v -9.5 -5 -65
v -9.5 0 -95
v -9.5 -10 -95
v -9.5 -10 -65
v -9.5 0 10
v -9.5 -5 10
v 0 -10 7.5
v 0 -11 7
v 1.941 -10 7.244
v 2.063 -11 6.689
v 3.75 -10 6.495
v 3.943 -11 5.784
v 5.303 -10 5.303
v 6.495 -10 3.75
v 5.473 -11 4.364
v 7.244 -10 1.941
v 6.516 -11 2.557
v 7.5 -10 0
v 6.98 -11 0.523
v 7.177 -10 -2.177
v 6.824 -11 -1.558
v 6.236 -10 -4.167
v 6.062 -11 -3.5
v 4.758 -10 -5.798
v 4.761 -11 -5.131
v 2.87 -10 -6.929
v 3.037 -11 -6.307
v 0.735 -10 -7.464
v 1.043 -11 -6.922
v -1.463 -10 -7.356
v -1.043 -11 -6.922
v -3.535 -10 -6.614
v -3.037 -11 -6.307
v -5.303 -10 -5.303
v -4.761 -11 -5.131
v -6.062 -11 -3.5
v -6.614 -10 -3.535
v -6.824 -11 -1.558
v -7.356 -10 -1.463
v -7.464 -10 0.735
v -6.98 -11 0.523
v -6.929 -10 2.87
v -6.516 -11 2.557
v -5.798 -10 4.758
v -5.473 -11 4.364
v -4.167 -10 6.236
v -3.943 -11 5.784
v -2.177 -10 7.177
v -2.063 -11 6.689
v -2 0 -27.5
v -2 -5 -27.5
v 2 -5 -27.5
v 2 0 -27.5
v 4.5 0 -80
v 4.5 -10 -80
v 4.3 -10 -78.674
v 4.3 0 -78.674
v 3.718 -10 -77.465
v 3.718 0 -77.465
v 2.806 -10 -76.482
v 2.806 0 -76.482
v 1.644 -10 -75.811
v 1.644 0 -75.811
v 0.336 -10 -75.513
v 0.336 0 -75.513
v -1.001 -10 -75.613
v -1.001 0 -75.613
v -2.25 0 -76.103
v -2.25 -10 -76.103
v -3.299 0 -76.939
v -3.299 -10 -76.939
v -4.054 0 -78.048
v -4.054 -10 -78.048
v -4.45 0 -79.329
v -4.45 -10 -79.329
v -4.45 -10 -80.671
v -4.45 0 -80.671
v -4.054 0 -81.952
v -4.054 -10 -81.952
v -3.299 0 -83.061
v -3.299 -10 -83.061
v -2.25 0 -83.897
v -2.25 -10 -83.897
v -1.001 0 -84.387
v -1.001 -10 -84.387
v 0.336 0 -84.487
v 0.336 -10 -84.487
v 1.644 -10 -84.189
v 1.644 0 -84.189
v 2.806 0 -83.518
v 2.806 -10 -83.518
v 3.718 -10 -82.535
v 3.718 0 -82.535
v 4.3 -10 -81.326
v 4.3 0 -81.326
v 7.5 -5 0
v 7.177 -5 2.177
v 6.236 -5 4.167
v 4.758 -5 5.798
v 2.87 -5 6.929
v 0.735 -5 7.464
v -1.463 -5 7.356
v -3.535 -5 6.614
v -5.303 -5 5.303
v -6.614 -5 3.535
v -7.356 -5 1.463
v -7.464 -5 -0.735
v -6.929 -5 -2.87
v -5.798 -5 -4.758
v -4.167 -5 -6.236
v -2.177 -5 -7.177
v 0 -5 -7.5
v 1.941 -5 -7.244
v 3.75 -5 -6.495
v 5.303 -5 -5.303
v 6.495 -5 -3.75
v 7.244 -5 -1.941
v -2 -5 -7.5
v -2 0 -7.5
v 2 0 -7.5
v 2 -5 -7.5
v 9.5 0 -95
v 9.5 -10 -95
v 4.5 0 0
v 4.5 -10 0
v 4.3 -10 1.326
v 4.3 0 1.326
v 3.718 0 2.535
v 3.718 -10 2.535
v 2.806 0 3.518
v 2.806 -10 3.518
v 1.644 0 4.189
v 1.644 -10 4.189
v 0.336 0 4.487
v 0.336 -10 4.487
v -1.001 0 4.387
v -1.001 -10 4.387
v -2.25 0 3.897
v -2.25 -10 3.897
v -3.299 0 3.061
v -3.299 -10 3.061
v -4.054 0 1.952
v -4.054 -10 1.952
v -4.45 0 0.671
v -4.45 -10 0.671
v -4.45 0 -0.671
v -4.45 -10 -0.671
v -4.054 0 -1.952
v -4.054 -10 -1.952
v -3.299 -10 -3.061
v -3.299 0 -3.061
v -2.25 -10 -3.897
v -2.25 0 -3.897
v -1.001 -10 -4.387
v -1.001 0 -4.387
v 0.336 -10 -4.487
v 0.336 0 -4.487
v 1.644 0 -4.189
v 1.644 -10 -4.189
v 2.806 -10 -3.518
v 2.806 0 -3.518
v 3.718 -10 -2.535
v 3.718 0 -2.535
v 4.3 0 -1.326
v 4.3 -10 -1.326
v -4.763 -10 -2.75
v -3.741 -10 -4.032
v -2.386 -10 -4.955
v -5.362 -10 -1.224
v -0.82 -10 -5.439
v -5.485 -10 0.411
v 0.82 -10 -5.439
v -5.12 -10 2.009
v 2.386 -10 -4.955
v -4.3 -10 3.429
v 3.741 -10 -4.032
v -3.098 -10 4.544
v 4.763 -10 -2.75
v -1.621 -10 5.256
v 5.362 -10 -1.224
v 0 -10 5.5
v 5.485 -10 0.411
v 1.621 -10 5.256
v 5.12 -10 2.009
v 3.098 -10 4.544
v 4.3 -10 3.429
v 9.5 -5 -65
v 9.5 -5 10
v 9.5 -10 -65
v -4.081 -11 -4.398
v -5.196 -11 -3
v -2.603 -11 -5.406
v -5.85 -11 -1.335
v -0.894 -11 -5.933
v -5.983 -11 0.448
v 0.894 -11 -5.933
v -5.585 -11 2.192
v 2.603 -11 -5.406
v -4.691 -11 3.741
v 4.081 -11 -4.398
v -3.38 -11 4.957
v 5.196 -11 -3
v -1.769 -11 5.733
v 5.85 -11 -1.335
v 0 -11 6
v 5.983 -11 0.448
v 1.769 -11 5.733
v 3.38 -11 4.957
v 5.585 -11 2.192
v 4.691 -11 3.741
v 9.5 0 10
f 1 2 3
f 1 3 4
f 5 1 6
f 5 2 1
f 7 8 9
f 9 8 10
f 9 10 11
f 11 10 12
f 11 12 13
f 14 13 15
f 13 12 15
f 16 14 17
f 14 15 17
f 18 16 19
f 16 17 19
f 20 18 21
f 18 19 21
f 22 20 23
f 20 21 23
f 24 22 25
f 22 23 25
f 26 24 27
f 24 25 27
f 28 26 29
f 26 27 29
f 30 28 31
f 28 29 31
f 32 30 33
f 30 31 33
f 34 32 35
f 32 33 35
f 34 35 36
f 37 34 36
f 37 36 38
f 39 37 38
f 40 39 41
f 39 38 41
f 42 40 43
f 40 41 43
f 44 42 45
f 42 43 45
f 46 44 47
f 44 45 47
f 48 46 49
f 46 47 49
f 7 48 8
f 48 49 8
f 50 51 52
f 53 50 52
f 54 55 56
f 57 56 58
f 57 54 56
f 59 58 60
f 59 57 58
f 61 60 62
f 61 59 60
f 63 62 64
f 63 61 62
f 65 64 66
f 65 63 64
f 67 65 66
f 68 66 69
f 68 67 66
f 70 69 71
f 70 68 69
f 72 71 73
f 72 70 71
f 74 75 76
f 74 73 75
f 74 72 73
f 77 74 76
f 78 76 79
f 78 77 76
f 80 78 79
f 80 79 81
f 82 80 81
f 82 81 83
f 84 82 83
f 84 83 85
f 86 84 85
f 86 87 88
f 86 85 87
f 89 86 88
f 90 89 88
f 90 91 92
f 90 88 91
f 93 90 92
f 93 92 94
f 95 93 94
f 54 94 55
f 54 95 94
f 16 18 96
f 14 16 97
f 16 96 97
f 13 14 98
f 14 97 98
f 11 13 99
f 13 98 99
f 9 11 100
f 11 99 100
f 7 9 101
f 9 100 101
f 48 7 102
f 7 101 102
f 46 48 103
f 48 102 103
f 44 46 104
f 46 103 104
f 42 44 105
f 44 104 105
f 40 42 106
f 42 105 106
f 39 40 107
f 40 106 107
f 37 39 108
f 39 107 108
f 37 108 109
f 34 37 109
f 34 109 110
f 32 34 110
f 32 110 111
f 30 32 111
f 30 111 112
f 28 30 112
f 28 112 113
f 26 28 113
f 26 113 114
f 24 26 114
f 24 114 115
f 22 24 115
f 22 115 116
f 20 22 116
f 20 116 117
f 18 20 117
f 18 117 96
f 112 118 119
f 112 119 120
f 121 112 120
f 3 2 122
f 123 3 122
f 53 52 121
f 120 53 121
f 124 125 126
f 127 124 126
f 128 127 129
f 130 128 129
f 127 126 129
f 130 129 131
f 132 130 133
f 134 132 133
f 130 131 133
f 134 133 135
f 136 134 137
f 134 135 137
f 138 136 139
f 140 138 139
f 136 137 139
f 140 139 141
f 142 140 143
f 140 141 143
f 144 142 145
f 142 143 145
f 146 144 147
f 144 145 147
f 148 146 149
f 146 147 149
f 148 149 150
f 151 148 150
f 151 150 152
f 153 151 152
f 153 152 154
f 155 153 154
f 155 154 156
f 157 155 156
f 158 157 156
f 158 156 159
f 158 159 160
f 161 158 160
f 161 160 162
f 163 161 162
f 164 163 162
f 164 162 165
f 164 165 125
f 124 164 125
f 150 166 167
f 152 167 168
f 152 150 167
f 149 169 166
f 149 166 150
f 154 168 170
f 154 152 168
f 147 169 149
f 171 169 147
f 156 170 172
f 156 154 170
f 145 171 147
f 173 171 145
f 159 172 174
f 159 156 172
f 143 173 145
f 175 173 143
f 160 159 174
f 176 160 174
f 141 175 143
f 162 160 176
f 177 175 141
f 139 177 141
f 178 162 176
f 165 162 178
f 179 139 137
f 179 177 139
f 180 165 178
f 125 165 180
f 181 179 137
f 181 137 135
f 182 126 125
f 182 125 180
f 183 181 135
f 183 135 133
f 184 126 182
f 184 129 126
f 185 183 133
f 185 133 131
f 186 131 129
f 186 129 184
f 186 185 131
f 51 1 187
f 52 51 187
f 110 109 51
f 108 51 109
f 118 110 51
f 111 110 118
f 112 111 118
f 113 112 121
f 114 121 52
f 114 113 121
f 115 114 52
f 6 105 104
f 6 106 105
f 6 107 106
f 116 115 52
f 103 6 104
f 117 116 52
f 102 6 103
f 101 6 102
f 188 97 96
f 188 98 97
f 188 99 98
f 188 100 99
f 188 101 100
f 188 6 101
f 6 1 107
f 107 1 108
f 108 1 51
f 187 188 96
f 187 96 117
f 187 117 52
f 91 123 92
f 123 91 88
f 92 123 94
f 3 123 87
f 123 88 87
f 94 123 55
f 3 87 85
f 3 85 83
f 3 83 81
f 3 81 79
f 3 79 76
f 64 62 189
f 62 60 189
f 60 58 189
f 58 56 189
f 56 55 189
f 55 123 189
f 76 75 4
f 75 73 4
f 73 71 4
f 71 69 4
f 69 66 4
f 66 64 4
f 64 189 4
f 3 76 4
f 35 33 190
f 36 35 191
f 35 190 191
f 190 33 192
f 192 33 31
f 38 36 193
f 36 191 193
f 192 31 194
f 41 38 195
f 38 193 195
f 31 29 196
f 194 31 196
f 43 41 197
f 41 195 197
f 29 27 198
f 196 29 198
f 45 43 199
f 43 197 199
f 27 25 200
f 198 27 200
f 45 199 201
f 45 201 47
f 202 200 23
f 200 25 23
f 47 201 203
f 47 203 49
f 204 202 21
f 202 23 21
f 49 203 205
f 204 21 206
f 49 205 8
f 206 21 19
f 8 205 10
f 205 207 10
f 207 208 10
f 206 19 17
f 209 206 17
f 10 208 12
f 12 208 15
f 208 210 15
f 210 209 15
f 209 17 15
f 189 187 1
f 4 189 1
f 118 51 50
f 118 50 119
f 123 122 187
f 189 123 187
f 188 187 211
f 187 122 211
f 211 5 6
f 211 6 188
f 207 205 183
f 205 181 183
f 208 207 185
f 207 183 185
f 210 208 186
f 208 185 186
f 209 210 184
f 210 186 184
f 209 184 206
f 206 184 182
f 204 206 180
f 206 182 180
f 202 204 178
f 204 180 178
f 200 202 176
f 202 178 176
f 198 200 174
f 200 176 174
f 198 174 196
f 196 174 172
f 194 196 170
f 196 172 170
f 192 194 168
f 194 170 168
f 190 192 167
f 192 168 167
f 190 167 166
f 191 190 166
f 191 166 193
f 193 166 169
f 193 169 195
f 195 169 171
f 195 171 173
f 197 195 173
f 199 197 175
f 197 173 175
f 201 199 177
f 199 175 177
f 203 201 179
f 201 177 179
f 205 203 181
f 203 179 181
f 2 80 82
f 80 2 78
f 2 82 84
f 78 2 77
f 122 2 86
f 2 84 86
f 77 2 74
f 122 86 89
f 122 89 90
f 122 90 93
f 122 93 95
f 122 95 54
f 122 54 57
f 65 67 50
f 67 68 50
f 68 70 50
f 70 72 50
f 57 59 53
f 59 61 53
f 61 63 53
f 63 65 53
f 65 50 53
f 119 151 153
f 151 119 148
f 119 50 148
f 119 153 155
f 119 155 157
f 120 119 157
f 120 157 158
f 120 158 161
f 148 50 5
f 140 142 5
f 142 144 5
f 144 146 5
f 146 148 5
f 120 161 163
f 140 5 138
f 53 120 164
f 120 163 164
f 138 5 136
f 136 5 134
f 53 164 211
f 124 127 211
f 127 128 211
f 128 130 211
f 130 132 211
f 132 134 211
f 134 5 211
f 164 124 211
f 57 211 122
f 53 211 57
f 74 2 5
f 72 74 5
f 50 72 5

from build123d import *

# Parameters (mm, degrees)
F0_W      = 19
F0_H      = 105
F1_DEPTH  = 5
F2_R      = 7.5
F3_DEPTH  = 5
F6_R      = 4.5
F7_DEPTH  = 10.001
F8_W      = 19
F8_H      = 30
F9_DEPTH  = 10
F10_R     = 4.5
F11_DEPTH = 11.001
F12_W     = 4
F12_H     = 20
F13_DEPTH = 5


with BuildPart() as f1:
    # F0 (on Front) → F1 (new body)
    with BuildSketch(Plane.XZ):
        with Locations((0, -42.5)):
            Rectangle(F0_W, F0_H)
    extrude(amount=F1_DEPTH)

    # F2 (on face) → F3 (join)
    with BuildSketch(Plane.XZ.offset(5)):
        Circle(F2_R)
    extrude(amount=F3_DEPTH)

    # F4 (on Right) → F5 (revolve)
    with BuildSketch(Plane.YZ):
        Polygon((-10, 5.5), (-10, 7.5), (-11, 7), (-11, 6), align=None)
    revolve(axis=Axis((0, -10.5, 0), (0, 1, 0)))

    # F6 (on face) → F7 (cut, through all)
    with BuildSketch(Plane.XZ.offset(10)):
        Circle(F6_R)
    extrude(amount=-F7_DEPTH, mode=Mode.SUBTRACT)

    # F8 (on face) → F9 (join)
    with BuildSketch(Plane(origin=(0, 0, 0), x_dir=(-1, 0, 0), z_dir=(0, 1, 0))):
        with Locations((0, -80)):
            Rectangle(F8_W, F8_H)
    extrude(amount=-F9_DEPTH)

    # F10 (on face) → F11 (cut, through all)
    with BuildSketch(Plane.XZ):
        with Locations((0, -80)):
            Circle(F10_R)
    extrude(amount=F11_DEPTH, mode=Mode.SUBTRACT)

    # F12 (on face) → F13 (cut, through all)
    with BuildSketch(Plane.XZ.offset(5)):
        with Locations((0, -17.5)):
            Rectangle(F12_W, F12_H)
    extrude(amount=-F13_DEPTH, mode=Mode.SUBTRACT)


solid = f1.part
